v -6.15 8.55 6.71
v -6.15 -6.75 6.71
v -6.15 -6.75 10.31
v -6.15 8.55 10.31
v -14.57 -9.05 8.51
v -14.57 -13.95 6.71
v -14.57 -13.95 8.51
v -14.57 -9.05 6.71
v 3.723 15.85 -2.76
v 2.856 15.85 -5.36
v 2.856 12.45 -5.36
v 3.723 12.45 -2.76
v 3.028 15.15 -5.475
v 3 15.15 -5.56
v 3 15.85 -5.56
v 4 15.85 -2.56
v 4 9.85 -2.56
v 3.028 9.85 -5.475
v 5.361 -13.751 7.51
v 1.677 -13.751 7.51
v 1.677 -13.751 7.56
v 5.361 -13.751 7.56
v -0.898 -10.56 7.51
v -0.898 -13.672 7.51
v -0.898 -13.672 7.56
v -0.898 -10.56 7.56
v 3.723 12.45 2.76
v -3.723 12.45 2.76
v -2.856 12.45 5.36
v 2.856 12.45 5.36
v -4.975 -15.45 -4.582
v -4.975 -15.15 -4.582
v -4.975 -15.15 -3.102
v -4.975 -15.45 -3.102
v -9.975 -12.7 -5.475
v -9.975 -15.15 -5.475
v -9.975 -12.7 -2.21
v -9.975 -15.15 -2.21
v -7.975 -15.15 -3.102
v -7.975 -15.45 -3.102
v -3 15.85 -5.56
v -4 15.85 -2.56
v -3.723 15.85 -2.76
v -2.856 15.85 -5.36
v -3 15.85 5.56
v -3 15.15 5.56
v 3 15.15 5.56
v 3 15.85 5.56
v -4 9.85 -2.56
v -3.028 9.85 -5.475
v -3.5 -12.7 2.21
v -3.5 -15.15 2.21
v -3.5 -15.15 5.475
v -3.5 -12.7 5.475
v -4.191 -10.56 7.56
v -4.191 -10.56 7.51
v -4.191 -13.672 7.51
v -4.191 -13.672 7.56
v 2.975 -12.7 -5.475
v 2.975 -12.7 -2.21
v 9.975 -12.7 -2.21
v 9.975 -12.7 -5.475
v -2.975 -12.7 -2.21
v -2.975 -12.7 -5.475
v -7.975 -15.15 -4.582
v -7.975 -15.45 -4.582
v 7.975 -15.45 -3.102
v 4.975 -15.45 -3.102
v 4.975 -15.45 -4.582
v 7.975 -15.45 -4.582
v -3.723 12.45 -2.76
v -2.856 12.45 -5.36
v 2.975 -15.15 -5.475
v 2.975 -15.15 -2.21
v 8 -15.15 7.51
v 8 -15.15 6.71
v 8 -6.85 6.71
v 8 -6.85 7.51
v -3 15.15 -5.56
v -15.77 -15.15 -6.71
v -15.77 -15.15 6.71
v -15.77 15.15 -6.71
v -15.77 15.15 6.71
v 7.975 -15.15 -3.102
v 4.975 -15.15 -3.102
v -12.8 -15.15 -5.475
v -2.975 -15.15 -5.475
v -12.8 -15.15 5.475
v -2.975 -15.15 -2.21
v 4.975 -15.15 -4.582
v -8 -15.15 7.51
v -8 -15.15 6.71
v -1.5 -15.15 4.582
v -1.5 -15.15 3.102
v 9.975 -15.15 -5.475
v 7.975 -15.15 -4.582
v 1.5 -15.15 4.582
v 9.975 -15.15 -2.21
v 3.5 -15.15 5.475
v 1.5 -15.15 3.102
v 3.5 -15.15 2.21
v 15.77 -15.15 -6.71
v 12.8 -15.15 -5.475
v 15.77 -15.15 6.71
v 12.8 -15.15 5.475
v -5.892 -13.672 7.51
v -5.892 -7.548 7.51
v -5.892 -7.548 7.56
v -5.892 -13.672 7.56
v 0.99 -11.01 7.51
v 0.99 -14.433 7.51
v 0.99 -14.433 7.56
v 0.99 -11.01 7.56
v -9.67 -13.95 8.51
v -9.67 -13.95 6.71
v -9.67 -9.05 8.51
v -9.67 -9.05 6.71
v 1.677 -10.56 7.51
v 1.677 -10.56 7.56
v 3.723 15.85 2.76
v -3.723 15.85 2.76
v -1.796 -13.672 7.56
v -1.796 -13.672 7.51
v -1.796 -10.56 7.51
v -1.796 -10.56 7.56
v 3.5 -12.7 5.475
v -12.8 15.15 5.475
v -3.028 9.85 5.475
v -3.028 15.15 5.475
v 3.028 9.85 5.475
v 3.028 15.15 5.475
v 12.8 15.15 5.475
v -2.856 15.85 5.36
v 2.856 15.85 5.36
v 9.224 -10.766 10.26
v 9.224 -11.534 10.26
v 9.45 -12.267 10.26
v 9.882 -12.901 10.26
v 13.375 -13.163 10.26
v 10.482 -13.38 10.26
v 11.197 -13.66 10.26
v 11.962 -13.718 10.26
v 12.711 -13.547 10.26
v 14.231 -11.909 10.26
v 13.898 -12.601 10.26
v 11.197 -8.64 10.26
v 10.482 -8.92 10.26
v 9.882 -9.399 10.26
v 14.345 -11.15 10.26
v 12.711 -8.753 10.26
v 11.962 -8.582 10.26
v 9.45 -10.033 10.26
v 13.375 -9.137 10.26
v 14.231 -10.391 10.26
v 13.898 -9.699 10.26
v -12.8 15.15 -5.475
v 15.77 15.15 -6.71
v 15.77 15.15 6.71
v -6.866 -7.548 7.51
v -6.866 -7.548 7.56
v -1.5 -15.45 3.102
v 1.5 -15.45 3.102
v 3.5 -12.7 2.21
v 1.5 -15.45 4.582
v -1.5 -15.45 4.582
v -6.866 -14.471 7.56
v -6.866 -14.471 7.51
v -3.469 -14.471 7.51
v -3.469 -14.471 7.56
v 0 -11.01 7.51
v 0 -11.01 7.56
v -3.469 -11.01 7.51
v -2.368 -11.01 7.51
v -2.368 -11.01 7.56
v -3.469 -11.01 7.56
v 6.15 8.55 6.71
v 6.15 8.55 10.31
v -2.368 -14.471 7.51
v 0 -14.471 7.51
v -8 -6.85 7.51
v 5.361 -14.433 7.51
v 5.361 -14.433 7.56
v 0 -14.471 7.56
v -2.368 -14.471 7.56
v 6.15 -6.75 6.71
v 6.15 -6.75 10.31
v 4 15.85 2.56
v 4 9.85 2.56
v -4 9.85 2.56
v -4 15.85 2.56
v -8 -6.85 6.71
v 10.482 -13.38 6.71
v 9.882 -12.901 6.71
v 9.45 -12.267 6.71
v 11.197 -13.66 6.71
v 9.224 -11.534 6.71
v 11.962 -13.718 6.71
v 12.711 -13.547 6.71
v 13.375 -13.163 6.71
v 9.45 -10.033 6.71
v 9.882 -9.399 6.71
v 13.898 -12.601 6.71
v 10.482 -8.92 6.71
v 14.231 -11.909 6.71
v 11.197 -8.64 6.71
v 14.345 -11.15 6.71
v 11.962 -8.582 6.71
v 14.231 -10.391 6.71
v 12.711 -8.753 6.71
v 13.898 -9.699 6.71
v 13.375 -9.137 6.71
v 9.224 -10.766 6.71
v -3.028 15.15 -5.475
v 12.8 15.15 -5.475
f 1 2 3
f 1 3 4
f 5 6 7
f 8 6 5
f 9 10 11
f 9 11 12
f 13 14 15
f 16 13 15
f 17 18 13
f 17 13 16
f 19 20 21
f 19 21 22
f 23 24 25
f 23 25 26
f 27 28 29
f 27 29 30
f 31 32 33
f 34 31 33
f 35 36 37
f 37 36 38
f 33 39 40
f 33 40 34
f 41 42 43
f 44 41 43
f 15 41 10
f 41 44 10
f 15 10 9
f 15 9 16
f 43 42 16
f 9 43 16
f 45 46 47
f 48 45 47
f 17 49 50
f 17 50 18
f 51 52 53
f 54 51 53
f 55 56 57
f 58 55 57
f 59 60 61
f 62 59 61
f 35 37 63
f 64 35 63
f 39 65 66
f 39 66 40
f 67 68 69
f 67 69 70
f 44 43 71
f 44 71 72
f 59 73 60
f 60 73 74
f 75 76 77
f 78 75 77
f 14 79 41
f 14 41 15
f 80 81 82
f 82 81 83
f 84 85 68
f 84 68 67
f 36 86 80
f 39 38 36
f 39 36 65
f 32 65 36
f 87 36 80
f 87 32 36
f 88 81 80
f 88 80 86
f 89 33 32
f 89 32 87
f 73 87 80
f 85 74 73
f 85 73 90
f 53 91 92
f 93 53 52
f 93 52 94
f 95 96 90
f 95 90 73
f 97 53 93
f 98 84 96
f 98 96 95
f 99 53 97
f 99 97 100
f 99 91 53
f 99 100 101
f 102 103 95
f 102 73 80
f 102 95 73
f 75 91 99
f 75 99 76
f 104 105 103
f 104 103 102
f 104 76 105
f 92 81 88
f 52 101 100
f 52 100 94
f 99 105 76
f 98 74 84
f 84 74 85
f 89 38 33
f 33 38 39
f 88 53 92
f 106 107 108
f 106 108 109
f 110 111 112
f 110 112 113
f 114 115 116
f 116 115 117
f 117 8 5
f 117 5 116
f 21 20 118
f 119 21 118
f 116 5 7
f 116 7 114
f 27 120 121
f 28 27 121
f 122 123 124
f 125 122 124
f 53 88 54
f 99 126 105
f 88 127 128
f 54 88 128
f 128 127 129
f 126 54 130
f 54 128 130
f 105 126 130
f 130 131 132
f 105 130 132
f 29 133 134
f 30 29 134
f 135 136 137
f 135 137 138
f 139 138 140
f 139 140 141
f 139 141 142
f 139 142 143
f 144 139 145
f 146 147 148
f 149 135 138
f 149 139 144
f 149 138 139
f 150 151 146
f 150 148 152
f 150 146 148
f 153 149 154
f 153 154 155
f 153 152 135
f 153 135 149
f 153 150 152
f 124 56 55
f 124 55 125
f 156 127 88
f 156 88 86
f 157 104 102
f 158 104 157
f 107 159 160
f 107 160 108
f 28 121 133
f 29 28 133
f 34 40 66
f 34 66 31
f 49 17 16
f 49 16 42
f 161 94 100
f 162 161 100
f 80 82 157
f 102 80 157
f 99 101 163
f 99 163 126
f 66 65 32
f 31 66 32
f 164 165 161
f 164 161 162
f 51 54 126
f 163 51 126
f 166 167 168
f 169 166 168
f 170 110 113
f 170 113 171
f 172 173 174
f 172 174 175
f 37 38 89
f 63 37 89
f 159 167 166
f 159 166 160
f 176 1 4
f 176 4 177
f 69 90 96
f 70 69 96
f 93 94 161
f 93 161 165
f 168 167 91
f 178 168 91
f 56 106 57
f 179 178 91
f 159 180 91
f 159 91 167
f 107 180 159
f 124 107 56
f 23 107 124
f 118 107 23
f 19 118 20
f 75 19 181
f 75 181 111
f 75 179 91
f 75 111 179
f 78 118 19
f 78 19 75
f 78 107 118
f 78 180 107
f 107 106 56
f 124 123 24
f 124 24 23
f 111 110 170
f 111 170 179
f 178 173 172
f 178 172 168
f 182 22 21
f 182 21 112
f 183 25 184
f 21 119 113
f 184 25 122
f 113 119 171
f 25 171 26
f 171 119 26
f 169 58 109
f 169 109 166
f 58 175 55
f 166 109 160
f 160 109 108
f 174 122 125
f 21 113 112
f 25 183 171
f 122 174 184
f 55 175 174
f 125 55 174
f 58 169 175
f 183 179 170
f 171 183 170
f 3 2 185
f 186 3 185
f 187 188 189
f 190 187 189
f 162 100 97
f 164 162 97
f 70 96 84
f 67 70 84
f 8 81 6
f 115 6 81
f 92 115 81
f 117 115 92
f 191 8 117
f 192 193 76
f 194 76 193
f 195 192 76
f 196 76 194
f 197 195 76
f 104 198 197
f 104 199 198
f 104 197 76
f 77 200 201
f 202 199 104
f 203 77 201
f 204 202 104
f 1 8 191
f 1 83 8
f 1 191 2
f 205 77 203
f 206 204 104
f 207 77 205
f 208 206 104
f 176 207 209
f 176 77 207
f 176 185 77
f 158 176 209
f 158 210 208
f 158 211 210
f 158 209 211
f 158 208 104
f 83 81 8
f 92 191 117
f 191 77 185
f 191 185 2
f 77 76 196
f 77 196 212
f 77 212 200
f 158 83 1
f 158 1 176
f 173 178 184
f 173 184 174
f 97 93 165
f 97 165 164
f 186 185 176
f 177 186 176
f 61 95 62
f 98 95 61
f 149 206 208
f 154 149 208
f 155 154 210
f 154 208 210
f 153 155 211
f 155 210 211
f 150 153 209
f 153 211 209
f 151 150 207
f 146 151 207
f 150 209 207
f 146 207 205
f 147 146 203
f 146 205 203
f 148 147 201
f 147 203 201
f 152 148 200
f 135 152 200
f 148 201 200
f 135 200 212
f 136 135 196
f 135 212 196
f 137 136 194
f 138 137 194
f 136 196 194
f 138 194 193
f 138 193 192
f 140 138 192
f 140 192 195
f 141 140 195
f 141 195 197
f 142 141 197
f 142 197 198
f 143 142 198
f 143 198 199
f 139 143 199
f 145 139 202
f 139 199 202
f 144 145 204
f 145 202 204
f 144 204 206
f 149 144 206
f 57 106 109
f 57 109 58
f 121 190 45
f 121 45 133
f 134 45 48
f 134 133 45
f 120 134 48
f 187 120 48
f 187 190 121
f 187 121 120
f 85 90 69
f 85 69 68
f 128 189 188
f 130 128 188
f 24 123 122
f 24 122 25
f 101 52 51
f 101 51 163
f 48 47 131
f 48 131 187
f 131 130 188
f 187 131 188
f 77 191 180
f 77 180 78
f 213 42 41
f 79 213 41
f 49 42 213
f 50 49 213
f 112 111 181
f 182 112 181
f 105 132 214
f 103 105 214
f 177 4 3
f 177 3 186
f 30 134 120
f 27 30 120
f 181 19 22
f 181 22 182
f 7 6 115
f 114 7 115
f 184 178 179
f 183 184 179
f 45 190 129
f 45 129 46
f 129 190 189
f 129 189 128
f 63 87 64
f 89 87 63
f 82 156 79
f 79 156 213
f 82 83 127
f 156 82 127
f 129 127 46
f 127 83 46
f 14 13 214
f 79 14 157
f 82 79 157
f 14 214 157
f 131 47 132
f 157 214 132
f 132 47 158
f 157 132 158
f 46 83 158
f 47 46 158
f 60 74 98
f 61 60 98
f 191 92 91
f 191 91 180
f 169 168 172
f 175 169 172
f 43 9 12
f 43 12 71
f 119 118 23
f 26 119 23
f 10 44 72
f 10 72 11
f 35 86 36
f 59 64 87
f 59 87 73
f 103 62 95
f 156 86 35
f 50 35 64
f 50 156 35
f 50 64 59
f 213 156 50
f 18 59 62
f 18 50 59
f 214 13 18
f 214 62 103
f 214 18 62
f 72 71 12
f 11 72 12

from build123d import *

# Parameters (mm, degrees)
ESQUISSE1_W             = 31.54
ESQUISSE1_H             = 30.3
BOSS_EXTRU_1_DEPTH      = 6.71
ESQUISSE2_W             = 12.3
ESQUISSE2_H             = 15.3
BOSS_EXTRU_2_DEPTH      = 3.6
ESQUISSE9_W             = 25.6
ESQUISSE9_H             = 10.95
ENL_V_MAT_EXTRU_2_DEPTH = 36.680232623
BOSS_EXTRU_3_START      = -5.3
BOSS_EXTRU_3_DEPTH      = 6
ENL_V_MAT_EXTRU_1_DEPTH = 3.4
ESQUISSE5_W             = 16
ESQUISSE5_H             = 8.3
BOSS_EXTRU_4_DEPTH      = 0.8
BOSS_EXTRU_5_DEPTH      = 0.05
ESQUISSE7_W             = 4.9
ESQUISSE7_H             = 4.9
BOSS_EXTRU_6_DEPTH      = 1.8
ESQUISSE8_R             = 2.575
BOSS_EXTRU_7_DEPTH      = 3.55
ESQUISSE10_W            = 7
ESQUISSE10_H            = 3.3
BOSS_EXTRU_8_DEPTH      = 2.45
ESQUISSE11_W            = 3
ESQUISSE11_H            = 1.48
BOSS_EXTRU_9_DEPTH      = 0.3


with BuildPart() as part:
    # Esquisse1 → Boss.-Extru.1 (new, symmetric)
    with BuildSketch(Plane.XY):
        Rectangle(ESQUISSE1_W, ESQUISSE1_H)
    extrude(amount=BOSS_EXTRU_1_DEPTH, both=True)

    # Esquisse2 → Boss.-Extru.2 (add)
    with BuildSketch(Plane.XY.offset(6.71)):
        with Locations((0, 0.9)):
            Rectangle(ESQUISSE2_W, ESQUISSE2_H)
    extrude(amount=BOSS_EXTRU_2_DEPTH)

    # Esquisse9 → Enlèv. mat.-Extru.2 (cut, through all)
    with BuildSketch(Plane(origin=(0, 15.15, 0), x_dir=(1, 0, 0), z_dir=(0, 1, 0))):
        Rectangle(ESQUISSE9_W, ESQUISSE9_H)
    extrude(amount=-ENL_V_MAT_EXTRU_2_DEPTH, mode=Mode.SUBTRACT)

    # Esquisse3 → Boss.-Extru.3 (add)
    with BuildSketch(Plane(origin=(0, 15.15, 0), x_dir=(1, 0, 0), z_dir=(0, 1, 0)).offset(BOSS_EXTRU_3_START)):
        Polygon((-4, -2.56), (-3, -5.56), (3, -5.56), (4, -2.56), align=None)
    boss_extru_3 = extrude(amount=BOSS_EXTRU_3_DEPTH)

    # Esquisse4 → Enlèv. mat.-Extru.1 (cut)
    with BuildSketch(Plane(origin=(0, 15.85, 0), x_dir=(1, 0, 0), z_dir=(0, 1, 0))):
        Polygon((3.722514823, -2.76), (-3.722514823, -2.76), (-2.855848156, -5.36), (2.855848156, -5.36), align=None)
    enl_v_mat_extru_1 = extrude(amount=-ENL_V_MAT_EXTRU_1_DEPTH, mode=Mode.SUBTRACT)

    # Symétrie1: Boss.-Extru.3, Enlèv. mat.-Extru.1 across plane
    add(boss_extru_3.mirror(Plane.XY))
    add(enl_v_mat_extru_1.mirror(Plane.XY), mode=Mode.SUBTRACT)

    # Esquisse5 → Boss.-Extru.4 (add)
    with BuildSketch(Plane.XY.offset(6.71)):
        with Locations((0, -11)):
            Rectangle(ESQUISSE5_W, ESQUISSE5_H)
    extrude(amount=BOSS_EXTRU_4_DEPTH)

    # Esquisse6 → Boss.-Extru.5 (add)
    with BuildSketch(Plane.XY.offset(7.51)):
        Polygon((-6.865802853, -7.548465464), (-5.891959411, -7.548465464), (-5.891959411, -13.672228575), (-4.191256638, -13.672228575), (-4.191256638, -11.00969053), (-4.191256638, -10.559793746), (-1.795503566, -10.559793746), (-1.795503566, -11.00969053), (-1.795503566, -13.672228575), (-0.897751783, -13.672228575), (-0.897751783, -10.559793746), (0, -10.559793746), (1.676820822, -10.559793746), (1.676820822, -11.00969053), (1.676820822, -13.751215981), (5.361136535, -13.751215981), (5.361136535, -14.43345617), (1.676820822, -14.43345617), (0.989734758, -14.43345617), (0.989734758, -11.00969053), (0, -11.00969053), (0, -13.672228575), (0, -14.470915596), (-1.795503566, -14.470915596), (-2.368009826, -14.470915596), (-2.368009826, -11.00969053), (-3.468894756, -11.00969053), (-3.468894756, -13.672228575), (-3.468894756, -14.470915596), (-5.891959411, -14.470915596), (-6.865802853, -14.470915596), align=None)
    extrude(amount=BOSS_EXTRU_5_DEPTH)

    # Esquisse7 → Boss.-Extru.6 (add)
    with BuildSketch(Plane.XY.offset(6.71)):
        with Locations((-12.12, -11.5)):
            Rectangle(ESQUISSE7_W, ESQUISSE7_H)
    extrude(amount=BOSS_EXTRU_6_DEPTH)

    # Esquisse8 → Boss.-Extru.7 (add)
    with BuildSketch(Plane.XY.offset(6.71)):
        with Locations((11.77, -11.15)):
            Circle(ESQUISSE8_R)
    extrude(amount=BOSS_EXTRU_7_DEPTH)

    # Esquisse10 → Boss.-Extru.8 (add)
    with BuildSketch(Plane.XZ.offset(15.15)):
        with Locations((0, 3.86)):
            Rectangle(ESQUISSE10_W, ESQUISSE10_H)
        with Locations((-6.475, -3.86)):
            Rectangle(ESQUISSE10_W, ESQUISSE10_H)
        with Locations((6.475, -3.86)):
            Rectangle(ESQUISSE10_W, ESQUISSE10_H)
    extrude(amount=-BOSS_EXTRU_8_DEPTH)

    # Esquisse11 → Boss.-Extru.9 (add)
    with BuildSketch(Plane.XZ.offset(15.15)):
        with Locations((0, 3.8425)):
            Rectangle(ESQUISSE11_W, ESQUISSE11_H)
        with Locations((-6.475, -3.8425)):
            Rectangle(ESQUISSE11_W, ESQUISSE11_H)
        with Locations((6.475, -3.8425)):
            Rectangle(ESQUISSE11_W, ESQUISSE11_H)
    extrude(amount=BOSS_EXTRU_9_DEPTH)


solid = part.part
